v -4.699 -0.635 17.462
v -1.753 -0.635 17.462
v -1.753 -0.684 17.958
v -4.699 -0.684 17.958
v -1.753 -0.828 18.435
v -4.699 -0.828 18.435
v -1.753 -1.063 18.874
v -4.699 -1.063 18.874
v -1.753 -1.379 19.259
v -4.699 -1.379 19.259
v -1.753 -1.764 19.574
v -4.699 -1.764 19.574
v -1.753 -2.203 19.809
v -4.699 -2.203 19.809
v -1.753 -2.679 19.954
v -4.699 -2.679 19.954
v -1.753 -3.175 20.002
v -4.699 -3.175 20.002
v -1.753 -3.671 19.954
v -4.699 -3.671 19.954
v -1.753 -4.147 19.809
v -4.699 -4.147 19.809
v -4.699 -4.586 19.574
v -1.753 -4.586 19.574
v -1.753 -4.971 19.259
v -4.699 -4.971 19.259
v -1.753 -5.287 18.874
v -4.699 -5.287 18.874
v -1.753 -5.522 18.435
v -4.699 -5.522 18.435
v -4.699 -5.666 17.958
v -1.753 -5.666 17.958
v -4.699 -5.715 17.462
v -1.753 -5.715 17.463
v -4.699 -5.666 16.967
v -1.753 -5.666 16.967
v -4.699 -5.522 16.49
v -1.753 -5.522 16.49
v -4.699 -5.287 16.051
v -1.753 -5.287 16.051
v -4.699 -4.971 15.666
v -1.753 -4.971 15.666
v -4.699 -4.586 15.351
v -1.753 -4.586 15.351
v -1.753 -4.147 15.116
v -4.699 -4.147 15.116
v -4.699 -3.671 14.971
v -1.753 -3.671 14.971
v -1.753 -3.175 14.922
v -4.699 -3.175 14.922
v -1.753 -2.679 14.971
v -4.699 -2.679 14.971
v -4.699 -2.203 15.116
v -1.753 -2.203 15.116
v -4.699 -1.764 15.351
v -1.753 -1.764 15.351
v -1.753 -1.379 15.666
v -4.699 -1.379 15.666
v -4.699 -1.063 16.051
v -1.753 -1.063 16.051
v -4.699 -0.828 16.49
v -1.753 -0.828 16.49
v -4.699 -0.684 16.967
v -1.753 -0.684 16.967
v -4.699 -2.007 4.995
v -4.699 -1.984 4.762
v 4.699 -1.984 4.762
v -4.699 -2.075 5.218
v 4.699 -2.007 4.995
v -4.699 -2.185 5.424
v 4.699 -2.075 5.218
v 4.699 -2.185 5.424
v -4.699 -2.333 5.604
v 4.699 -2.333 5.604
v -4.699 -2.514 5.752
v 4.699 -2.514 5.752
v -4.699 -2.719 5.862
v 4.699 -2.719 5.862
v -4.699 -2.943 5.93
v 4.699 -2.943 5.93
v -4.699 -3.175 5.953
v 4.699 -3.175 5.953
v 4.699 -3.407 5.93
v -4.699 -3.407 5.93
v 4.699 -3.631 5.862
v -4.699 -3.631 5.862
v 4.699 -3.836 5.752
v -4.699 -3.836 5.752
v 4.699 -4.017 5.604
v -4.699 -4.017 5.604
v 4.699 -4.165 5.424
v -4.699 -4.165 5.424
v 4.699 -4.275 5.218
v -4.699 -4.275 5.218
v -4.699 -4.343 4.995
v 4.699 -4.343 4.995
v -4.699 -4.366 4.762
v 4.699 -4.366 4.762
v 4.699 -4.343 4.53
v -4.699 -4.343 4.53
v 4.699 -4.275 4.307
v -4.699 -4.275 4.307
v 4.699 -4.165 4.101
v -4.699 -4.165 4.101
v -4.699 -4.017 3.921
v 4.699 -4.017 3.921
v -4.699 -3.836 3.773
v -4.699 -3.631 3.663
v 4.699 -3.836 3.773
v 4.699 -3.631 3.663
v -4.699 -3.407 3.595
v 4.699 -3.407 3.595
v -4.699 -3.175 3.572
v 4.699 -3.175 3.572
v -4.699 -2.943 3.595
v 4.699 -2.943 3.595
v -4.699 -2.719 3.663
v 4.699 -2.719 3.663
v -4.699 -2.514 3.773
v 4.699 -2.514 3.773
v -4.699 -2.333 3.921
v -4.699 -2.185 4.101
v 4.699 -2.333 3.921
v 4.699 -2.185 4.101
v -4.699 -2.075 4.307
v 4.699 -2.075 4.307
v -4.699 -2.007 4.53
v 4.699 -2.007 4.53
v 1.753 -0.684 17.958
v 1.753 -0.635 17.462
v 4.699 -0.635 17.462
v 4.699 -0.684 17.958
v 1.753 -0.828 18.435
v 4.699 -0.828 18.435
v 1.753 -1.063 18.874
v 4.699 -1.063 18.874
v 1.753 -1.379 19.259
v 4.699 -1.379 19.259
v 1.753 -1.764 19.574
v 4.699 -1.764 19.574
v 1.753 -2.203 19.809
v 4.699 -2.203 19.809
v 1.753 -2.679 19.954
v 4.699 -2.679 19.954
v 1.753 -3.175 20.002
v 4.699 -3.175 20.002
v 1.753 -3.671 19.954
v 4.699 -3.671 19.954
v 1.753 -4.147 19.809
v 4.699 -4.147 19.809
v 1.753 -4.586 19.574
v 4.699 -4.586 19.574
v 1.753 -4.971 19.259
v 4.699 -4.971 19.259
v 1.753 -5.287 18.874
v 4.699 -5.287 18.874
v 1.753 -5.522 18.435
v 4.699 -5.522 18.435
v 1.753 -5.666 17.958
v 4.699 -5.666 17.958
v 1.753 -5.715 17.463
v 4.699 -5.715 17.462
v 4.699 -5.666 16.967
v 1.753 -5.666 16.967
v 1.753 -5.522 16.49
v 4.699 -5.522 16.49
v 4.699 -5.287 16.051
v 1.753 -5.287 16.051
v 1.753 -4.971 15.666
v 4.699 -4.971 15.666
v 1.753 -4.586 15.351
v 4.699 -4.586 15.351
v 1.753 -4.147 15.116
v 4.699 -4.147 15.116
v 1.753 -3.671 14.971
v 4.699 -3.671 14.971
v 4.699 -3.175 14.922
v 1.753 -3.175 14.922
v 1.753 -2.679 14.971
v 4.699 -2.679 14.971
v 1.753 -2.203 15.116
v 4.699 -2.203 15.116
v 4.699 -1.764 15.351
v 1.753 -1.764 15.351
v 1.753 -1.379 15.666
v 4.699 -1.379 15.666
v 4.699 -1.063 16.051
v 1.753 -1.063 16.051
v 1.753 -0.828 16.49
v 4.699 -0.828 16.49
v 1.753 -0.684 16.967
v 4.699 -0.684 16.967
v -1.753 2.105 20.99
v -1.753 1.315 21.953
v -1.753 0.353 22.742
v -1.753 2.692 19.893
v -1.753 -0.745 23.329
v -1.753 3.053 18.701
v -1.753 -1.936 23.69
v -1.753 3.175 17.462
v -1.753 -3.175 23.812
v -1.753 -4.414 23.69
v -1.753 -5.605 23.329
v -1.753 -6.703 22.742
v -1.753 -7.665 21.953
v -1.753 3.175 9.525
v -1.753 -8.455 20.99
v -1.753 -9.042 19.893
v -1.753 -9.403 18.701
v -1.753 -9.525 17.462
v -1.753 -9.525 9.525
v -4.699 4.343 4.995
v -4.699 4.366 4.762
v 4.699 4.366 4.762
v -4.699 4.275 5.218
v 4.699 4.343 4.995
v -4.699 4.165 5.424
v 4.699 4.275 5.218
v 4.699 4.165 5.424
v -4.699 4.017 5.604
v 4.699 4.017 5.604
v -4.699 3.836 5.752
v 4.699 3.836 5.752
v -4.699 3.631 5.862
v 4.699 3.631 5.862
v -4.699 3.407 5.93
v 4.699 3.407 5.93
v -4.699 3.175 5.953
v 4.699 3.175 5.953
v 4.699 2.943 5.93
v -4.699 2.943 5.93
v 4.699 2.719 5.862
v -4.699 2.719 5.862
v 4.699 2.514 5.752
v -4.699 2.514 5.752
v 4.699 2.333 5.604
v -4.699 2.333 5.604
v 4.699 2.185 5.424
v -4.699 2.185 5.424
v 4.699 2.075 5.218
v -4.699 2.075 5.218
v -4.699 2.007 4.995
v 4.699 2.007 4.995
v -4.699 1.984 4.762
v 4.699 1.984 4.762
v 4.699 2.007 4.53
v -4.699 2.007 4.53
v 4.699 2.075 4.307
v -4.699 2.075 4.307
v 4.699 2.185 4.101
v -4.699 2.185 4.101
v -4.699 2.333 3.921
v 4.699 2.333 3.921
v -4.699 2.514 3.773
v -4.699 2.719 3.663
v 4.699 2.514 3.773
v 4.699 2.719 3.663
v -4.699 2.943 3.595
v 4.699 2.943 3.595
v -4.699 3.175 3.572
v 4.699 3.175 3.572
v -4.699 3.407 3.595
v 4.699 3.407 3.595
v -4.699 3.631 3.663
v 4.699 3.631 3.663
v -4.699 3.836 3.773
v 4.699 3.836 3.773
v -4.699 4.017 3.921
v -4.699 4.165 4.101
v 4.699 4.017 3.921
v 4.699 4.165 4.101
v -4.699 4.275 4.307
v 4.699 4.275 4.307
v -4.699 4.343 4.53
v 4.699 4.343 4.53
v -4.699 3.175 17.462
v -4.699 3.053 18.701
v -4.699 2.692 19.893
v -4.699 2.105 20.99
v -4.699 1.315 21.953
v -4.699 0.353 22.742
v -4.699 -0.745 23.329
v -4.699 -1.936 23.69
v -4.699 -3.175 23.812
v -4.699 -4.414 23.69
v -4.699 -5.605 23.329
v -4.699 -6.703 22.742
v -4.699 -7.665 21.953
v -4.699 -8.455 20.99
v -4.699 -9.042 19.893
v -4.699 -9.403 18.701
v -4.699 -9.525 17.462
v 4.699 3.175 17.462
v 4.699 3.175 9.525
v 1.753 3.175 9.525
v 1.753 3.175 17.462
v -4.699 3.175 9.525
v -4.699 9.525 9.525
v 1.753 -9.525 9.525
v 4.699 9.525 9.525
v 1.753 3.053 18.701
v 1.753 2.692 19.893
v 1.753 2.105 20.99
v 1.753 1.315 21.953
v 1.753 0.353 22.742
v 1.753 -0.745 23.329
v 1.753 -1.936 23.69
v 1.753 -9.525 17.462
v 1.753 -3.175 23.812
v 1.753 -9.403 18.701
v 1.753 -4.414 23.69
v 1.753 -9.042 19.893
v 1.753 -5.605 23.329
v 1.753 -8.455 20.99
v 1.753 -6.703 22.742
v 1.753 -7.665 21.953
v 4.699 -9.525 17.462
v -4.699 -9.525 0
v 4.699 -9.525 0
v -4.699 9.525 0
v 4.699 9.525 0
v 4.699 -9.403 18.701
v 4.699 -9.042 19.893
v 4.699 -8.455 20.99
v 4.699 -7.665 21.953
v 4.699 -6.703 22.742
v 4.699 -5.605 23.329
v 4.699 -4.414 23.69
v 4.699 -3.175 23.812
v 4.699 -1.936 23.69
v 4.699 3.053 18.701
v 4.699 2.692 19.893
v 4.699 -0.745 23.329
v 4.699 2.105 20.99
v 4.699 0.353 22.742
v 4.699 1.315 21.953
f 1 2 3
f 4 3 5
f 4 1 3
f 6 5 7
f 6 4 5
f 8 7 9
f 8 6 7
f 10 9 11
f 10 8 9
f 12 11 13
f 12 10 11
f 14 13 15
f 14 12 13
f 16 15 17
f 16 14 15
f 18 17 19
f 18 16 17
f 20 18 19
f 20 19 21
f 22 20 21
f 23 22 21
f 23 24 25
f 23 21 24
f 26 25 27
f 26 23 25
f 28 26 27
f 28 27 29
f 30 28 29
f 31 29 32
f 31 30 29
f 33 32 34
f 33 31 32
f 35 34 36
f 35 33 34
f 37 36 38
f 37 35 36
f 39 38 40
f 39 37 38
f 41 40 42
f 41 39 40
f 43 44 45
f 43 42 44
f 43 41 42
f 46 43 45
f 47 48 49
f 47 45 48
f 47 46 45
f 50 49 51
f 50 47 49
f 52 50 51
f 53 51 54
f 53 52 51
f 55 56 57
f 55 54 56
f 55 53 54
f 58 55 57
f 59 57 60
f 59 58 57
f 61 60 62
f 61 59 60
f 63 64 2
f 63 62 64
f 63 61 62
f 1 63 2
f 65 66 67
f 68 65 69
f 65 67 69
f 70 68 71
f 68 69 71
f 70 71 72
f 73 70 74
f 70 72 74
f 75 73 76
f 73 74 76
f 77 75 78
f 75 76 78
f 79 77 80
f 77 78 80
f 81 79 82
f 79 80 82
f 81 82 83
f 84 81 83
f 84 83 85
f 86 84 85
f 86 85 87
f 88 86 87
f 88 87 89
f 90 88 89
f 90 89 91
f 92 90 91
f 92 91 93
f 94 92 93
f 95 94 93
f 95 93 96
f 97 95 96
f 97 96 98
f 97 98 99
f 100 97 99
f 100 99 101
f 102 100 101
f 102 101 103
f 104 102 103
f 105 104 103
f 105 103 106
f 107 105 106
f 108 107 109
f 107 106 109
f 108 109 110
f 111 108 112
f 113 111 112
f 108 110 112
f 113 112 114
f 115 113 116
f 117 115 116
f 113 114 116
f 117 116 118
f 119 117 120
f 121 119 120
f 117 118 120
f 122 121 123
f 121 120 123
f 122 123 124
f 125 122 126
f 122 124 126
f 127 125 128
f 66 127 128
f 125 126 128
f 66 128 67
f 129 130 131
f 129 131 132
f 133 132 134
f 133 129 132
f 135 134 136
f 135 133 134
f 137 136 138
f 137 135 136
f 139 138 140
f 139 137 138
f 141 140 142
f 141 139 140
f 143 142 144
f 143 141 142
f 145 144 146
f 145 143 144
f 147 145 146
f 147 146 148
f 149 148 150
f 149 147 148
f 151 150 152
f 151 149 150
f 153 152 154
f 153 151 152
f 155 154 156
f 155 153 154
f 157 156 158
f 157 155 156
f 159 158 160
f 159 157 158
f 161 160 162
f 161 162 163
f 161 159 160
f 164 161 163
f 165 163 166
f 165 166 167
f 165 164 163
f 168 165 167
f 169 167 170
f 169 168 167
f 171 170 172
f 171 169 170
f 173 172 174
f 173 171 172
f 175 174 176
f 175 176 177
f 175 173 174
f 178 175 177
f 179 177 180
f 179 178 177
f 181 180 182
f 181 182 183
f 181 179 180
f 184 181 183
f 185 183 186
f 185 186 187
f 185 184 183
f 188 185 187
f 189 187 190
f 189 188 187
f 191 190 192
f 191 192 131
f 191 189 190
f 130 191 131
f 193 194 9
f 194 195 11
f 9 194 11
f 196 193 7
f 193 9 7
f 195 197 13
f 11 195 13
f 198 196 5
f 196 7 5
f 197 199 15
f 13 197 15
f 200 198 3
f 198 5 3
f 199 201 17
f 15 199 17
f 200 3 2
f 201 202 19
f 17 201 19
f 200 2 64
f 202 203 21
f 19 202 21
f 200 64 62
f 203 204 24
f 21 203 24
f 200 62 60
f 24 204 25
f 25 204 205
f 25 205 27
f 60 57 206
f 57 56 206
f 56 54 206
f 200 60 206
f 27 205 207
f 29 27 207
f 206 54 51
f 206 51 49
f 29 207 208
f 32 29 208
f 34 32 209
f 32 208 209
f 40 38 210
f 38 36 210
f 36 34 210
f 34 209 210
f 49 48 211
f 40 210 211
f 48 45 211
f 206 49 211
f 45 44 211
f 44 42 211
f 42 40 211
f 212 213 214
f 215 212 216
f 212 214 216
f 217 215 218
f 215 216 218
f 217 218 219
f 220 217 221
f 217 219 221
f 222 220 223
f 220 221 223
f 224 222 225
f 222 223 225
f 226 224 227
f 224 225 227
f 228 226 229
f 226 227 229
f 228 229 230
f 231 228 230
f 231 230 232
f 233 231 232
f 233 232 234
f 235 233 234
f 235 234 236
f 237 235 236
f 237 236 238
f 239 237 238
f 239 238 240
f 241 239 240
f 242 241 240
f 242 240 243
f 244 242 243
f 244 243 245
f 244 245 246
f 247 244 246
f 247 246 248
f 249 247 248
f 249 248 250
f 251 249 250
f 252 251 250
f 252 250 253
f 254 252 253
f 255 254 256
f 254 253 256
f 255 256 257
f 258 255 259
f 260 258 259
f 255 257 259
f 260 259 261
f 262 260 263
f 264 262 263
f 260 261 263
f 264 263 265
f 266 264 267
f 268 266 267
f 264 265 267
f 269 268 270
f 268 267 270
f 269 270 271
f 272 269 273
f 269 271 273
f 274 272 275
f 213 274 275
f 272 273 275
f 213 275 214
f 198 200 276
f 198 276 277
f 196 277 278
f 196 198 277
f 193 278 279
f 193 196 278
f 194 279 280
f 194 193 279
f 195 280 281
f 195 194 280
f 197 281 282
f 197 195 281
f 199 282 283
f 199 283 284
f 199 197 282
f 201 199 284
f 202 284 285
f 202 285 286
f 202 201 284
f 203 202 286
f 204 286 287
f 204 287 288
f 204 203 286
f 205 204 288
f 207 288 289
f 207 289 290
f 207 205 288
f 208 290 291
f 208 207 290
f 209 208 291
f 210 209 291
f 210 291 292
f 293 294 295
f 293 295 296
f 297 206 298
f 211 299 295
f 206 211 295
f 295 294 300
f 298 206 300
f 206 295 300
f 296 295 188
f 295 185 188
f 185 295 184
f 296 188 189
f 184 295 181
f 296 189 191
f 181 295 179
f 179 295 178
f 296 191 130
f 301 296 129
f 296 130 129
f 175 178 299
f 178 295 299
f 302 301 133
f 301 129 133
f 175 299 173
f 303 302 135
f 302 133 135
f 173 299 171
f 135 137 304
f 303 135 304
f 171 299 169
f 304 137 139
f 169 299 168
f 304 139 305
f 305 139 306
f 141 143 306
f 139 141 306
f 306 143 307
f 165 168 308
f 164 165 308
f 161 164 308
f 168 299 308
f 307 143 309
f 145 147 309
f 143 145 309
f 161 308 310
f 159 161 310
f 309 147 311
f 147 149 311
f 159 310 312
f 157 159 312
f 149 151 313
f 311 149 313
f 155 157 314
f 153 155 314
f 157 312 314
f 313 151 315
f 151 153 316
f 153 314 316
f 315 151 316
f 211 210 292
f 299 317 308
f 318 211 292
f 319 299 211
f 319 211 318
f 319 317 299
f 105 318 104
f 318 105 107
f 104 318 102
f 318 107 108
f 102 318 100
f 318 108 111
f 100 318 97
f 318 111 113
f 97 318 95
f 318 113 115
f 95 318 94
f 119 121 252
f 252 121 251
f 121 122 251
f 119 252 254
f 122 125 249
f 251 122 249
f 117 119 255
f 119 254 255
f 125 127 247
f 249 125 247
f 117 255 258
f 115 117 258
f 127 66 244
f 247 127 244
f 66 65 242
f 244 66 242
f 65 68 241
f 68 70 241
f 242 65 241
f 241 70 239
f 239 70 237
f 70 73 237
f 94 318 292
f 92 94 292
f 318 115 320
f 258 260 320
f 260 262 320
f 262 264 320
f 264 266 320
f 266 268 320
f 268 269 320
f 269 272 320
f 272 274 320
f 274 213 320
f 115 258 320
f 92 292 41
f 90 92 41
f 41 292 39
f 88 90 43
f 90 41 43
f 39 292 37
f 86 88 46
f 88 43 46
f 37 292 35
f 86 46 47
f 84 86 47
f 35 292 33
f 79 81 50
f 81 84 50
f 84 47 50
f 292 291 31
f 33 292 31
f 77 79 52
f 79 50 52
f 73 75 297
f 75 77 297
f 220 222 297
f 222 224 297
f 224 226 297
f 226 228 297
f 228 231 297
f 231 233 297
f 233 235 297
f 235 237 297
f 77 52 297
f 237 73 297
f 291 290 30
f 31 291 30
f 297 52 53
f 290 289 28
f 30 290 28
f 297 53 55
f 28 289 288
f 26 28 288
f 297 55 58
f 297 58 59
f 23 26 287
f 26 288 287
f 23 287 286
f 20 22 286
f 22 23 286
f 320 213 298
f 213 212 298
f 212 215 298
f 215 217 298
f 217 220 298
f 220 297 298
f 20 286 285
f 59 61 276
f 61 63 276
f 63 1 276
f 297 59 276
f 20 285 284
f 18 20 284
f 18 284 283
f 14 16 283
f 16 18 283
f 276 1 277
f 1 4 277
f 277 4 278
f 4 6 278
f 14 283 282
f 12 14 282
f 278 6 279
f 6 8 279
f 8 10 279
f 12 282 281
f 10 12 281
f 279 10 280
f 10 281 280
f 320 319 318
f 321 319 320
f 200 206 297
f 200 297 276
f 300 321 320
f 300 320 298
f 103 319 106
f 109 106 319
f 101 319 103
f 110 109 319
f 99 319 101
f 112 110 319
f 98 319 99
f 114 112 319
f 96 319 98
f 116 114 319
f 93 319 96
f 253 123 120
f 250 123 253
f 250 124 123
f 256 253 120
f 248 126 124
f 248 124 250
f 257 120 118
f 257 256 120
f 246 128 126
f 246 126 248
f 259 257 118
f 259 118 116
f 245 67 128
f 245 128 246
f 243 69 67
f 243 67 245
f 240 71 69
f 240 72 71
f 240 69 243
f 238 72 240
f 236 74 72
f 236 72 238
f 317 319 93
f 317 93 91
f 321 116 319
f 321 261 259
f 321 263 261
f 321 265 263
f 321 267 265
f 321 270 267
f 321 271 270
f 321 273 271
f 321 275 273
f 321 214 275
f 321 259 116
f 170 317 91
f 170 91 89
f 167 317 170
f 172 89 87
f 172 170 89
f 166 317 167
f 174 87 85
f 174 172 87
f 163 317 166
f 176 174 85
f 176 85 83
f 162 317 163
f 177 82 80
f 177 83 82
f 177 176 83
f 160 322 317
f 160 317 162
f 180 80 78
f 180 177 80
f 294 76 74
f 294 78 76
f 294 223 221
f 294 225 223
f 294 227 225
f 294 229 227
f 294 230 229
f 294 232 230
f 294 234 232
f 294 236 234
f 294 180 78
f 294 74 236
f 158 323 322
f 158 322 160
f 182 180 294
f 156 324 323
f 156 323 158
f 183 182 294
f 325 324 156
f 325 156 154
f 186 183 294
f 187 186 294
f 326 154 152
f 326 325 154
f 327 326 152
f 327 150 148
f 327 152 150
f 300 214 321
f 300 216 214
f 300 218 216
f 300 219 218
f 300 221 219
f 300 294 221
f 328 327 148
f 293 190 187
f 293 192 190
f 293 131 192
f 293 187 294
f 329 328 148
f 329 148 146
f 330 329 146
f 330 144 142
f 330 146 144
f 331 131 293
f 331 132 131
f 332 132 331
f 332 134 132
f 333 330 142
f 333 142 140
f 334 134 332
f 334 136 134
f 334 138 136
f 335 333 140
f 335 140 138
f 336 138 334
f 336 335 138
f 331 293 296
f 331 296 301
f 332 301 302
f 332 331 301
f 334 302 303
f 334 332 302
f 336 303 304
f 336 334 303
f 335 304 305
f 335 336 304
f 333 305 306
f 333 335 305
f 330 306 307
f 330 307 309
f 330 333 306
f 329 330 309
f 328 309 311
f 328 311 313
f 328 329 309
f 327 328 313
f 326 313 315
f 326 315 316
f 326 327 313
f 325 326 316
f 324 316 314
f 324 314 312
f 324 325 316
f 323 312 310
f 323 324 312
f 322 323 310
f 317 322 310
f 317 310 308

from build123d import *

# Parameters (mm, degrees)
F0_W     = 19.05
F0_H     = 9.525
F1_DEPTH = 4.699
F2_R     = 2.54
F3_DEPTH = 4.699
F4_R     = 1.190625
F5_DEPTH = 9.399
F6_W     = 3.5052
F6_H     = 9.525
F7_DEPTH = 19.051


with BuildPart() as f1:
    # F0 (on Right) → F1 (new body, symmetric)
    with BuildSketch(Plane.YZ):
        with Locations((0, 4.7625)):
            Rectangle(F0_W, F0_H)
    extrude(amount=F1_DEPTH, both=True)

    # F2 (on Right) → F3 (join, symmetric)
    with BuildSketch(Plane.YZ):
        with BuildLine():
            ThreePointArc((-9.525, 17.4625), (-3.175, 11.1125), (3.175, 17.4625))
            ThreePointArc((3.175, 17.4625), (-3.175, 23.8125), (-9.525, 17.4625))
        make_face()
        with Locations((-3.175, 17.4625)):
            Circle(F2_R, mode=Mode.SUBTRACT)
        with BuildLine():
            Line((3.175, 0), (3.175, 17.4625))
            ThreePointArc((3.175, 17.4625), (-3.175, 11.1125), (-9.525, 17.4625))
            Line((-9.525, 17.4625), (-9.525, 0))
            Line((-9.525, 0), (3.175, 0))
        make_face()
    extrude(amount=F3_DEPTH, both=True)

    # F4 (on face) → F5 (cut, through all)
    with BuildSketch(Plane.YZ.offset(4.699)):
        with Locations((-3.175, 4.7625)):
            Circle(F4_R)
        with Locations((3.175, 4.7625)):
            Circle(F4_R)
    extrude(amount=-F5_DEPTH, mode=Mode.SUBTRACT)

    # F6 (on face) → F7 (cut, through all)
    with BuildSketch(Plane.XZ.offset(9.525)):
        with Locations((0, 23.8125)):
            Rectangle(F6_W, F6_H)
        with Locations((0, 14.2875)):
            Rectangle(F6_W, F6_H)
    extrude(amount=-F7_DEPTH, mode=Mode.SUBTRACT)


solid = f1.part
